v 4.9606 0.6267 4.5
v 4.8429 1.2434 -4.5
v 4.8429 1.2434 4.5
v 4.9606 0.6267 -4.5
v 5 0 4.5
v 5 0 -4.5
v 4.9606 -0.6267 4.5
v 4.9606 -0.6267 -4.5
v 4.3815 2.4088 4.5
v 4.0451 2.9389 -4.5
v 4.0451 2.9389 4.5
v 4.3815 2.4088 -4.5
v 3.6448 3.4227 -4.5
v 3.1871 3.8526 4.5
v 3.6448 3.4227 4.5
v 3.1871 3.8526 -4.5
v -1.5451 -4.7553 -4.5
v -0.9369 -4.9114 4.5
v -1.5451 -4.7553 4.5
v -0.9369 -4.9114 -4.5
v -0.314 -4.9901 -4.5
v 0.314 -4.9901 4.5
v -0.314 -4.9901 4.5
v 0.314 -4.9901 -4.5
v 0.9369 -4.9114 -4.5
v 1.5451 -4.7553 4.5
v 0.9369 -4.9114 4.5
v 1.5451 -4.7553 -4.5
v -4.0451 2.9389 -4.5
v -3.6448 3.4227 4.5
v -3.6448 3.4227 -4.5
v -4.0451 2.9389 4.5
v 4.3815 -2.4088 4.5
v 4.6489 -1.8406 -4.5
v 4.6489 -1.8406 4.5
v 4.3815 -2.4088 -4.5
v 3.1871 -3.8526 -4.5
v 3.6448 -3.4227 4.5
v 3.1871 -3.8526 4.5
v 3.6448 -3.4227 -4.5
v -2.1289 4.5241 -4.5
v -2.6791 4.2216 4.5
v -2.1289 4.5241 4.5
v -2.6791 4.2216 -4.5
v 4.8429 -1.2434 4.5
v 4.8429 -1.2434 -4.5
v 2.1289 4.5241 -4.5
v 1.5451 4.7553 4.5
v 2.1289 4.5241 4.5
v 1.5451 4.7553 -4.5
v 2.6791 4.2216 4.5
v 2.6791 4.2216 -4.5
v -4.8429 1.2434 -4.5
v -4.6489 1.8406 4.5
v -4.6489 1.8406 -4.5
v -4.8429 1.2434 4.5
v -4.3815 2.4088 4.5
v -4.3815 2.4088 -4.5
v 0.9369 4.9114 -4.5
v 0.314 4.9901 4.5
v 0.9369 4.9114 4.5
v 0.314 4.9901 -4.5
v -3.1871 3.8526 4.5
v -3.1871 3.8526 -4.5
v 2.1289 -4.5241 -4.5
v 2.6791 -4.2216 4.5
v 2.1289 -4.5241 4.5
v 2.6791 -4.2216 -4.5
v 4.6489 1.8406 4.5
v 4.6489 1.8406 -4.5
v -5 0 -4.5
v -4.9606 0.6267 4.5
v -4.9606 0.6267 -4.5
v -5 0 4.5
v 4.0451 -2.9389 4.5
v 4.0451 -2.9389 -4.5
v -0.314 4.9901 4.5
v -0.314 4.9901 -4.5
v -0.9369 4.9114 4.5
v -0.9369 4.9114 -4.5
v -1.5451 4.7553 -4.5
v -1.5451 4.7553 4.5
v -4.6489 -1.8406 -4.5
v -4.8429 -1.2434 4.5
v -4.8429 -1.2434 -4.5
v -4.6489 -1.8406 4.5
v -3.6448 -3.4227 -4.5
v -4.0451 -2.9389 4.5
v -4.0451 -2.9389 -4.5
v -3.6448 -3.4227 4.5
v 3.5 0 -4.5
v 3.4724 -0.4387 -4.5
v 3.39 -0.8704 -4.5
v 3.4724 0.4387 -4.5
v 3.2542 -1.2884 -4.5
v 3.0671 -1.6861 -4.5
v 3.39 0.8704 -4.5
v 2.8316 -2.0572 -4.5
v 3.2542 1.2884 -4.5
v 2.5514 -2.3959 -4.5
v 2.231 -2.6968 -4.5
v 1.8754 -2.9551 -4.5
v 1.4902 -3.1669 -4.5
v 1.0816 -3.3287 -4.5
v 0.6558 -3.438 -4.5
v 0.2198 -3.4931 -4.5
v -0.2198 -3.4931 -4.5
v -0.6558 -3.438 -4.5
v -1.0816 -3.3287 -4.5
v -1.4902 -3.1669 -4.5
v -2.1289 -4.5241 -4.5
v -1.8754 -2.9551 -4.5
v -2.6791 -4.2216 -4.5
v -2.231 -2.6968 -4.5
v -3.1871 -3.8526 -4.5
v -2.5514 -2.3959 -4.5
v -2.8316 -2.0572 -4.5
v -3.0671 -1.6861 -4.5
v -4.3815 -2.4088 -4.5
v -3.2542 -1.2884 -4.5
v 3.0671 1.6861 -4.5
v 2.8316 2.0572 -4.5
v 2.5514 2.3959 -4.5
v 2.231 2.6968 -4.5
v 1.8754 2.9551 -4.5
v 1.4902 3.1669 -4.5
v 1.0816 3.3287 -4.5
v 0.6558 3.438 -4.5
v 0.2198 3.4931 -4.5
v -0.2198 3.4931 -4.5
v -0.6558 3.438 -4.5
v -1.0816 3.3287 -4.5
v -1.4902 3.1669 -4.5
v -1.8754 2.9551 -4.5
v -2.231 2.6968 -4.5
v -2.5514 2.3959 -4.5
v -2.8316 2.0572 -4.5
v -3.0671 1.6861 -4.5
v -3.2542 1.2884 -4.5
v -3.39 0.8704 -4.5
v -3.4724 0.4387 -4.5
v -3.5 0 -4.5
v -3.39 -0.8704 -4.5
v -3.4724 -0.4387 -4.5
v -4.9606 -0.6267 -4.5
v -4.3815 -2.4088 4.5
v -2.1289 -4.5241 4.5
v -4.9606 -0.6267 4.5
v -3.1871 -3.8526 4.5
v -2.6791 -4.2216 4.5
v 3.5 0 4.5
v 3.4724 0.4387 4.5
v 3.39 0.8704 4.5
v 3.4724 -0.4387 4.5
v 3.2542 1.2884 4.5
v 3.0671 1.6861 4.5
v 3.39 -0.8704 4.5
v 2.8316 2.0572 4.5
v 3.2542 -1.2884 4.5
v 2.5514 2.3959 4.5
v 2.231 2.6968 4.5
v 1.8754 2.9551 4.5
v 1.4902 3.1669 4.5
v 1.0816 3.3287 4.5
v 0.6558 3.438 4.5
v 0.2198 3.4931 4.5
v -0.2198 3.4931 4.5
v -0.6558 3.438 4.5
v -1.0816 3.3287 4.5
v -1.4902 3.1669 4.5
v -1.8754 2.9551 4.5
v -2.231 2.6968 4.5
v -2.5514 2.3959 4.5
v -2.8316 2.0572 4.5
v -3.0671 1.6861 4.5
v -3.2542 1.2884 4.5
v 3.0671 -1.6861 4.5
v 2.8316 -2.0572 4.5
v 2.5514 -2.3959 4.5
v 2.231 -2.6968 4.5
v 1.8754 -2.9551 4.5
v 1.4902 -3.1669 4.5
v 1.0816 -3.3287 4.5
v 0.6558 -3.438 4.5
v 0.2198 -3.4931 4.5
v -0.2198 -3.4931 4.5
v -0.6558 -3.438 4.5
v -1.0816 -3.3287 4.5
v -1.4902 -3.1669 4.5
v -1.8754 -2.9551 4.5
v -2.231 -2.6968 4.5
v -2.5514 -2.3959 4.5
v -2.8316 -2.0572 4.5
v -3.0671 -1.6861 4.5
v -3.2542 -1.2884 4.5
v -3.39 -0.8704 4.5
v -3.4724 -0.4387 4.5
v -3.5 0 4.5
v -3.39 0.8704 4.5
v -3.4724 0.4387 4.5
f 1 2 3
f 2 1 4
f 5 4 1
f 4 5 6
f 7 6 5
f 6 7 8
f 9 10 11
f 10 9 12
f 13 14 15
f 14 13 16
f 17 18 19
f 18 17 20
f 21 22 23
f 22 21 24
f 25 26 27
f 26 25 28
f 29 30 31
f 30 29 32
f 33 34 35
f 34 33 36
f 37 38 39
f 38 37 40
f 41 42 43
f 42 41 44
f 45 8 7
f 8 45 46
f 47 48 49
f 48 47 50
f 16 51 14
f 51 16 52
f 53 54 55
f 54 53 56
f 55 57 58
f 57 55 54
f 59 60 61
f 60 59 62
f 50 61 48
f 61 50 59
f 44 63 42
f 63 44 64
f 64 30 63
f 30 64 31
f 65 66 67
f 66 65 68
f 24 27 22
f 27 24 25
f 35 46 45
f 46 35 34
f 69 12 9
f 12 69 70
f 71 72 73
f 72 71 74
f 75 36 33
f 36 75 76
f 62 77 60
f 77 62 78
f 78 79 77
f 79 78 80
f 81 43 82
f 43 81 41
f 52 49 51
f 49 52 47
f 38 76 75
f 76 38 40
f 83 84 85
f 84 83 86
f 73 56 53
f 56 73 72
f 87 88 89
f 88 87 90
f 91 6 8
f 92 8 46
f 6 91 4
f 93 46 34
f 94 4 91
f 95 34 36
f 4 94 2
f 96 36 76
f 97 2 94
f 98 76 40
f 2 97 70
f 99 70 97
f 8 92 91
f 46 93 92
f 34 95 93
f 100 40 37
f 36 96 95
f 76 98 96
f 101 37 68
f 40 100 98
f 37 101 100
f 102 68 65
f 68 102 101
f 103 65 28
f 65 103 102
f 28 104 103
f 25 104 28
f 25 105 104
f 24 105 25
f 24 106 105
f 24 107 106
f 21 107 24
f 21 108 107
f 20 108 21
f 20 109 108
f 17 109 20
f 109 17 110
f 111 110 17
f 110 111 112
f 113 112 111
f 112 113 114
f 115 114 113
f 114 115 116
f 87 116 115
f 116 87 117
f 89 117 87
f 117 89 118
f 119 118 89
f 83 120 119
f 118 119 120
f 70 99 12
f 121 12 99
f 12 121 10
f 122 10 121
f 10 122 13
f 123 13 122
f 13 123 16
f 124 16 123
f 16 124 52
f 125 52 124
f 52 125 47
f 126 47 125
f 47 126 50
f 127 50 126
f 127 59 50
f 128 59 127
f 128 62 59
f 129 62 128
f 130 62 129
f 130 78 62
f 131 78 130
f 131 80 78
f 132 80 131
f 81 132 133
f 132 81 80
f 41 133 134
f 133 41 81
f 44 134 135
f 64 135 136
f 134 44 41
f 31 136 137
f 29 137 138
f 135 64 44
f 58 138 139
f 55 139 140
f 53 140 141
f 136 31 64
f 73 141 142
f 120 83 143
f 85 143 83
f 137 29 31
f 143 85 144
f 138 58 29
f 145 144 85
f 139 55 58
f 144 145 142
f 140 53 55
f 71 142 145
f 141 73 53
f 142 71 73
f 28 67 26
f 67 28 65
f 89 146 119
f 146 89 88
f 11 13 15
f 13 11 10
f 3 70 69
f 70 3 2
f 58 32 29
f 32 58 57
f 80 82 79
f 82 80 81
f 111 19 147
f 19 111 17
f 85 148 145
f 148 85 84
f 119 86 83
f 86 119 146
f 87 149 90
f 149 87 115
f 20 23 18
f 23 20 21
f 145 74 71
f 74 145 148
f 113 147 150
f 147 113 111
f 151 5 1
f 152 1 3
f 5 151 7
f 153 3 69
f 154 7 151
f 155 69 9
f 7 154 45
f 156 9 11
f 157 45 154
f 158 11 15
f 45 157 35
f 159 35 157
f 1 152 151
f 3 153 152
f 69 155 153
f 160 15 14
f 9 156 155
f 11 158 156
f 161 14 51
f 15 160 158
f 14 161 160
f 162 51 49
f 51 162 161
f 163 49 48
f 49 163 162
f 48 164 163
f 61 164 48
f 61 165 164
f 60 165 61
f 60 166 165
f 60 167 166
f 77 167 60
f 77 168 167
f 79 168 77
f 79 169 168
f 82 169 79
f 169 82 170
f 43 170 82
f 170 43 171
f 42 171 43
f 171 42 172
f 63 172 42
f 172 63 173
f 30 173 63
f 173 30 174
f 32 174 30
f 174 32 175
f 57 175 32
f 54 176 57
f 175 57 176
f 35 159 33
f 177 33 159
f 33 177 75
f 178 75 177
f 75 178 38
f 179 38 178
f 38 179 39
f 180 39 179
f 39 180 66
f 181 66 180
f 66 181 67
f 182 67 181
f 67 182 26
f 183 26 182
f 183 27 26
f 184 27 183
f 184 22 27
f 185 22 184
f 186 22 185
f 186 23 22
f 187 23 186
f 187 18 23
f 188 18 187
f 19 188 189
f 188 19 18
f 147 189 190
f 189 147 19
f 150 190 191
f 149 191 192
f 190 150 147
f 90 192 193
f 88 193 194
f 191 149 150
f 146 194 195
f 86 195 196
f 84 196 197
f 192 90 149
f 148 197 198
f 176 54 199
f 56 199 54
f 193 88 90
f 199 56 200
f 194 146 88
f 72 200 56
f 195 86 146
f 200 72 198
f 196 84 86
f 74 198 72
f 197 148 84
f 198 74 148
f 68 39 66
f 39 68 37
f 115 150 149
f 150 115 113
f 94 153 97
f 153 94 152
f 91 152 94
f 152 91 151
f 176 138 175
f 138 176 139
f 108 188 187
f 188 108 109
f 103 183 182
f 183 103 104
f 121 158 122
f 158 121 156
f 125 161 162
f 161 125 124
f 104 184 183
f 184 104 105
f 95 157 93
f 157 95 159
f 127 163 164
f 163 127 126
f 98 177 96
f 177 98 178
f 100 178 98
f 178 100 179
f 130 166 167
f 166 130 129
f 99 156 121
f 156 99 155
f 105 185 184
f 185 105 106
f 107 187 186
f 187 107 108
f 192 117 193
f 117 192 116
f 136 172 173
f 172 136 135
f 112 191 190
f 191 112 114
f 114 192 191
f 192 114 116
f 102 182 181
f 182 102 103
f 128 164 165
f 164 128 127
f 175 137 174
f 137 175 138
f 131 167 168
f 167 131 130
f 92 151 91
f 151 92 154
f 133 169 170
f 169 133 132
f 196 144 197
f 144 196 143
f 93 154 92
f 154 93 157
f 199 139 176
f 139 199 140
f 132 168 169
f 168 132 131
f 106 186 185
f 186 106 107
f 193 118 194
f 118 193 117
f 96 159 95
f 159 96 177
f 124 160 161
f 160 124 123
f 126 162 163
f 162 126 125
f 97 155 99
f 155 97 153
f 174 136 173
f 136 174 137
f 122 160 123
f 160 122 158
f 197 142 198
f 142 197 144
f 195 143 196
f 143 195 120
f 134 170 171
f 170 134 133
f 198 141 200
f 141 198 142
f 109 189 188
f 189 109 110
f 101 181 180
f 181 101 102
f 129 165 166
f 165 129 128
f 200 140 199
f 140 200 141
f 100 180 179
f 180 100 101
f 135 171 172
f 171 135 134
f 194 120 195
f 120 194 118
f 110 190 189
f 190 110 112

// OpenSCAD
$fn = 50;


difference() {
	union() {
		translate(v = [0, 0, -4.5000000000]) {
			cylinder(h = 9, r = 5.0000000000);
		}
	}
	union() {
		translate(v = [0, 0, -100.0000000000]) {
			cylinder(h = 200, r = 3.5000000000);
		}
	}
}
